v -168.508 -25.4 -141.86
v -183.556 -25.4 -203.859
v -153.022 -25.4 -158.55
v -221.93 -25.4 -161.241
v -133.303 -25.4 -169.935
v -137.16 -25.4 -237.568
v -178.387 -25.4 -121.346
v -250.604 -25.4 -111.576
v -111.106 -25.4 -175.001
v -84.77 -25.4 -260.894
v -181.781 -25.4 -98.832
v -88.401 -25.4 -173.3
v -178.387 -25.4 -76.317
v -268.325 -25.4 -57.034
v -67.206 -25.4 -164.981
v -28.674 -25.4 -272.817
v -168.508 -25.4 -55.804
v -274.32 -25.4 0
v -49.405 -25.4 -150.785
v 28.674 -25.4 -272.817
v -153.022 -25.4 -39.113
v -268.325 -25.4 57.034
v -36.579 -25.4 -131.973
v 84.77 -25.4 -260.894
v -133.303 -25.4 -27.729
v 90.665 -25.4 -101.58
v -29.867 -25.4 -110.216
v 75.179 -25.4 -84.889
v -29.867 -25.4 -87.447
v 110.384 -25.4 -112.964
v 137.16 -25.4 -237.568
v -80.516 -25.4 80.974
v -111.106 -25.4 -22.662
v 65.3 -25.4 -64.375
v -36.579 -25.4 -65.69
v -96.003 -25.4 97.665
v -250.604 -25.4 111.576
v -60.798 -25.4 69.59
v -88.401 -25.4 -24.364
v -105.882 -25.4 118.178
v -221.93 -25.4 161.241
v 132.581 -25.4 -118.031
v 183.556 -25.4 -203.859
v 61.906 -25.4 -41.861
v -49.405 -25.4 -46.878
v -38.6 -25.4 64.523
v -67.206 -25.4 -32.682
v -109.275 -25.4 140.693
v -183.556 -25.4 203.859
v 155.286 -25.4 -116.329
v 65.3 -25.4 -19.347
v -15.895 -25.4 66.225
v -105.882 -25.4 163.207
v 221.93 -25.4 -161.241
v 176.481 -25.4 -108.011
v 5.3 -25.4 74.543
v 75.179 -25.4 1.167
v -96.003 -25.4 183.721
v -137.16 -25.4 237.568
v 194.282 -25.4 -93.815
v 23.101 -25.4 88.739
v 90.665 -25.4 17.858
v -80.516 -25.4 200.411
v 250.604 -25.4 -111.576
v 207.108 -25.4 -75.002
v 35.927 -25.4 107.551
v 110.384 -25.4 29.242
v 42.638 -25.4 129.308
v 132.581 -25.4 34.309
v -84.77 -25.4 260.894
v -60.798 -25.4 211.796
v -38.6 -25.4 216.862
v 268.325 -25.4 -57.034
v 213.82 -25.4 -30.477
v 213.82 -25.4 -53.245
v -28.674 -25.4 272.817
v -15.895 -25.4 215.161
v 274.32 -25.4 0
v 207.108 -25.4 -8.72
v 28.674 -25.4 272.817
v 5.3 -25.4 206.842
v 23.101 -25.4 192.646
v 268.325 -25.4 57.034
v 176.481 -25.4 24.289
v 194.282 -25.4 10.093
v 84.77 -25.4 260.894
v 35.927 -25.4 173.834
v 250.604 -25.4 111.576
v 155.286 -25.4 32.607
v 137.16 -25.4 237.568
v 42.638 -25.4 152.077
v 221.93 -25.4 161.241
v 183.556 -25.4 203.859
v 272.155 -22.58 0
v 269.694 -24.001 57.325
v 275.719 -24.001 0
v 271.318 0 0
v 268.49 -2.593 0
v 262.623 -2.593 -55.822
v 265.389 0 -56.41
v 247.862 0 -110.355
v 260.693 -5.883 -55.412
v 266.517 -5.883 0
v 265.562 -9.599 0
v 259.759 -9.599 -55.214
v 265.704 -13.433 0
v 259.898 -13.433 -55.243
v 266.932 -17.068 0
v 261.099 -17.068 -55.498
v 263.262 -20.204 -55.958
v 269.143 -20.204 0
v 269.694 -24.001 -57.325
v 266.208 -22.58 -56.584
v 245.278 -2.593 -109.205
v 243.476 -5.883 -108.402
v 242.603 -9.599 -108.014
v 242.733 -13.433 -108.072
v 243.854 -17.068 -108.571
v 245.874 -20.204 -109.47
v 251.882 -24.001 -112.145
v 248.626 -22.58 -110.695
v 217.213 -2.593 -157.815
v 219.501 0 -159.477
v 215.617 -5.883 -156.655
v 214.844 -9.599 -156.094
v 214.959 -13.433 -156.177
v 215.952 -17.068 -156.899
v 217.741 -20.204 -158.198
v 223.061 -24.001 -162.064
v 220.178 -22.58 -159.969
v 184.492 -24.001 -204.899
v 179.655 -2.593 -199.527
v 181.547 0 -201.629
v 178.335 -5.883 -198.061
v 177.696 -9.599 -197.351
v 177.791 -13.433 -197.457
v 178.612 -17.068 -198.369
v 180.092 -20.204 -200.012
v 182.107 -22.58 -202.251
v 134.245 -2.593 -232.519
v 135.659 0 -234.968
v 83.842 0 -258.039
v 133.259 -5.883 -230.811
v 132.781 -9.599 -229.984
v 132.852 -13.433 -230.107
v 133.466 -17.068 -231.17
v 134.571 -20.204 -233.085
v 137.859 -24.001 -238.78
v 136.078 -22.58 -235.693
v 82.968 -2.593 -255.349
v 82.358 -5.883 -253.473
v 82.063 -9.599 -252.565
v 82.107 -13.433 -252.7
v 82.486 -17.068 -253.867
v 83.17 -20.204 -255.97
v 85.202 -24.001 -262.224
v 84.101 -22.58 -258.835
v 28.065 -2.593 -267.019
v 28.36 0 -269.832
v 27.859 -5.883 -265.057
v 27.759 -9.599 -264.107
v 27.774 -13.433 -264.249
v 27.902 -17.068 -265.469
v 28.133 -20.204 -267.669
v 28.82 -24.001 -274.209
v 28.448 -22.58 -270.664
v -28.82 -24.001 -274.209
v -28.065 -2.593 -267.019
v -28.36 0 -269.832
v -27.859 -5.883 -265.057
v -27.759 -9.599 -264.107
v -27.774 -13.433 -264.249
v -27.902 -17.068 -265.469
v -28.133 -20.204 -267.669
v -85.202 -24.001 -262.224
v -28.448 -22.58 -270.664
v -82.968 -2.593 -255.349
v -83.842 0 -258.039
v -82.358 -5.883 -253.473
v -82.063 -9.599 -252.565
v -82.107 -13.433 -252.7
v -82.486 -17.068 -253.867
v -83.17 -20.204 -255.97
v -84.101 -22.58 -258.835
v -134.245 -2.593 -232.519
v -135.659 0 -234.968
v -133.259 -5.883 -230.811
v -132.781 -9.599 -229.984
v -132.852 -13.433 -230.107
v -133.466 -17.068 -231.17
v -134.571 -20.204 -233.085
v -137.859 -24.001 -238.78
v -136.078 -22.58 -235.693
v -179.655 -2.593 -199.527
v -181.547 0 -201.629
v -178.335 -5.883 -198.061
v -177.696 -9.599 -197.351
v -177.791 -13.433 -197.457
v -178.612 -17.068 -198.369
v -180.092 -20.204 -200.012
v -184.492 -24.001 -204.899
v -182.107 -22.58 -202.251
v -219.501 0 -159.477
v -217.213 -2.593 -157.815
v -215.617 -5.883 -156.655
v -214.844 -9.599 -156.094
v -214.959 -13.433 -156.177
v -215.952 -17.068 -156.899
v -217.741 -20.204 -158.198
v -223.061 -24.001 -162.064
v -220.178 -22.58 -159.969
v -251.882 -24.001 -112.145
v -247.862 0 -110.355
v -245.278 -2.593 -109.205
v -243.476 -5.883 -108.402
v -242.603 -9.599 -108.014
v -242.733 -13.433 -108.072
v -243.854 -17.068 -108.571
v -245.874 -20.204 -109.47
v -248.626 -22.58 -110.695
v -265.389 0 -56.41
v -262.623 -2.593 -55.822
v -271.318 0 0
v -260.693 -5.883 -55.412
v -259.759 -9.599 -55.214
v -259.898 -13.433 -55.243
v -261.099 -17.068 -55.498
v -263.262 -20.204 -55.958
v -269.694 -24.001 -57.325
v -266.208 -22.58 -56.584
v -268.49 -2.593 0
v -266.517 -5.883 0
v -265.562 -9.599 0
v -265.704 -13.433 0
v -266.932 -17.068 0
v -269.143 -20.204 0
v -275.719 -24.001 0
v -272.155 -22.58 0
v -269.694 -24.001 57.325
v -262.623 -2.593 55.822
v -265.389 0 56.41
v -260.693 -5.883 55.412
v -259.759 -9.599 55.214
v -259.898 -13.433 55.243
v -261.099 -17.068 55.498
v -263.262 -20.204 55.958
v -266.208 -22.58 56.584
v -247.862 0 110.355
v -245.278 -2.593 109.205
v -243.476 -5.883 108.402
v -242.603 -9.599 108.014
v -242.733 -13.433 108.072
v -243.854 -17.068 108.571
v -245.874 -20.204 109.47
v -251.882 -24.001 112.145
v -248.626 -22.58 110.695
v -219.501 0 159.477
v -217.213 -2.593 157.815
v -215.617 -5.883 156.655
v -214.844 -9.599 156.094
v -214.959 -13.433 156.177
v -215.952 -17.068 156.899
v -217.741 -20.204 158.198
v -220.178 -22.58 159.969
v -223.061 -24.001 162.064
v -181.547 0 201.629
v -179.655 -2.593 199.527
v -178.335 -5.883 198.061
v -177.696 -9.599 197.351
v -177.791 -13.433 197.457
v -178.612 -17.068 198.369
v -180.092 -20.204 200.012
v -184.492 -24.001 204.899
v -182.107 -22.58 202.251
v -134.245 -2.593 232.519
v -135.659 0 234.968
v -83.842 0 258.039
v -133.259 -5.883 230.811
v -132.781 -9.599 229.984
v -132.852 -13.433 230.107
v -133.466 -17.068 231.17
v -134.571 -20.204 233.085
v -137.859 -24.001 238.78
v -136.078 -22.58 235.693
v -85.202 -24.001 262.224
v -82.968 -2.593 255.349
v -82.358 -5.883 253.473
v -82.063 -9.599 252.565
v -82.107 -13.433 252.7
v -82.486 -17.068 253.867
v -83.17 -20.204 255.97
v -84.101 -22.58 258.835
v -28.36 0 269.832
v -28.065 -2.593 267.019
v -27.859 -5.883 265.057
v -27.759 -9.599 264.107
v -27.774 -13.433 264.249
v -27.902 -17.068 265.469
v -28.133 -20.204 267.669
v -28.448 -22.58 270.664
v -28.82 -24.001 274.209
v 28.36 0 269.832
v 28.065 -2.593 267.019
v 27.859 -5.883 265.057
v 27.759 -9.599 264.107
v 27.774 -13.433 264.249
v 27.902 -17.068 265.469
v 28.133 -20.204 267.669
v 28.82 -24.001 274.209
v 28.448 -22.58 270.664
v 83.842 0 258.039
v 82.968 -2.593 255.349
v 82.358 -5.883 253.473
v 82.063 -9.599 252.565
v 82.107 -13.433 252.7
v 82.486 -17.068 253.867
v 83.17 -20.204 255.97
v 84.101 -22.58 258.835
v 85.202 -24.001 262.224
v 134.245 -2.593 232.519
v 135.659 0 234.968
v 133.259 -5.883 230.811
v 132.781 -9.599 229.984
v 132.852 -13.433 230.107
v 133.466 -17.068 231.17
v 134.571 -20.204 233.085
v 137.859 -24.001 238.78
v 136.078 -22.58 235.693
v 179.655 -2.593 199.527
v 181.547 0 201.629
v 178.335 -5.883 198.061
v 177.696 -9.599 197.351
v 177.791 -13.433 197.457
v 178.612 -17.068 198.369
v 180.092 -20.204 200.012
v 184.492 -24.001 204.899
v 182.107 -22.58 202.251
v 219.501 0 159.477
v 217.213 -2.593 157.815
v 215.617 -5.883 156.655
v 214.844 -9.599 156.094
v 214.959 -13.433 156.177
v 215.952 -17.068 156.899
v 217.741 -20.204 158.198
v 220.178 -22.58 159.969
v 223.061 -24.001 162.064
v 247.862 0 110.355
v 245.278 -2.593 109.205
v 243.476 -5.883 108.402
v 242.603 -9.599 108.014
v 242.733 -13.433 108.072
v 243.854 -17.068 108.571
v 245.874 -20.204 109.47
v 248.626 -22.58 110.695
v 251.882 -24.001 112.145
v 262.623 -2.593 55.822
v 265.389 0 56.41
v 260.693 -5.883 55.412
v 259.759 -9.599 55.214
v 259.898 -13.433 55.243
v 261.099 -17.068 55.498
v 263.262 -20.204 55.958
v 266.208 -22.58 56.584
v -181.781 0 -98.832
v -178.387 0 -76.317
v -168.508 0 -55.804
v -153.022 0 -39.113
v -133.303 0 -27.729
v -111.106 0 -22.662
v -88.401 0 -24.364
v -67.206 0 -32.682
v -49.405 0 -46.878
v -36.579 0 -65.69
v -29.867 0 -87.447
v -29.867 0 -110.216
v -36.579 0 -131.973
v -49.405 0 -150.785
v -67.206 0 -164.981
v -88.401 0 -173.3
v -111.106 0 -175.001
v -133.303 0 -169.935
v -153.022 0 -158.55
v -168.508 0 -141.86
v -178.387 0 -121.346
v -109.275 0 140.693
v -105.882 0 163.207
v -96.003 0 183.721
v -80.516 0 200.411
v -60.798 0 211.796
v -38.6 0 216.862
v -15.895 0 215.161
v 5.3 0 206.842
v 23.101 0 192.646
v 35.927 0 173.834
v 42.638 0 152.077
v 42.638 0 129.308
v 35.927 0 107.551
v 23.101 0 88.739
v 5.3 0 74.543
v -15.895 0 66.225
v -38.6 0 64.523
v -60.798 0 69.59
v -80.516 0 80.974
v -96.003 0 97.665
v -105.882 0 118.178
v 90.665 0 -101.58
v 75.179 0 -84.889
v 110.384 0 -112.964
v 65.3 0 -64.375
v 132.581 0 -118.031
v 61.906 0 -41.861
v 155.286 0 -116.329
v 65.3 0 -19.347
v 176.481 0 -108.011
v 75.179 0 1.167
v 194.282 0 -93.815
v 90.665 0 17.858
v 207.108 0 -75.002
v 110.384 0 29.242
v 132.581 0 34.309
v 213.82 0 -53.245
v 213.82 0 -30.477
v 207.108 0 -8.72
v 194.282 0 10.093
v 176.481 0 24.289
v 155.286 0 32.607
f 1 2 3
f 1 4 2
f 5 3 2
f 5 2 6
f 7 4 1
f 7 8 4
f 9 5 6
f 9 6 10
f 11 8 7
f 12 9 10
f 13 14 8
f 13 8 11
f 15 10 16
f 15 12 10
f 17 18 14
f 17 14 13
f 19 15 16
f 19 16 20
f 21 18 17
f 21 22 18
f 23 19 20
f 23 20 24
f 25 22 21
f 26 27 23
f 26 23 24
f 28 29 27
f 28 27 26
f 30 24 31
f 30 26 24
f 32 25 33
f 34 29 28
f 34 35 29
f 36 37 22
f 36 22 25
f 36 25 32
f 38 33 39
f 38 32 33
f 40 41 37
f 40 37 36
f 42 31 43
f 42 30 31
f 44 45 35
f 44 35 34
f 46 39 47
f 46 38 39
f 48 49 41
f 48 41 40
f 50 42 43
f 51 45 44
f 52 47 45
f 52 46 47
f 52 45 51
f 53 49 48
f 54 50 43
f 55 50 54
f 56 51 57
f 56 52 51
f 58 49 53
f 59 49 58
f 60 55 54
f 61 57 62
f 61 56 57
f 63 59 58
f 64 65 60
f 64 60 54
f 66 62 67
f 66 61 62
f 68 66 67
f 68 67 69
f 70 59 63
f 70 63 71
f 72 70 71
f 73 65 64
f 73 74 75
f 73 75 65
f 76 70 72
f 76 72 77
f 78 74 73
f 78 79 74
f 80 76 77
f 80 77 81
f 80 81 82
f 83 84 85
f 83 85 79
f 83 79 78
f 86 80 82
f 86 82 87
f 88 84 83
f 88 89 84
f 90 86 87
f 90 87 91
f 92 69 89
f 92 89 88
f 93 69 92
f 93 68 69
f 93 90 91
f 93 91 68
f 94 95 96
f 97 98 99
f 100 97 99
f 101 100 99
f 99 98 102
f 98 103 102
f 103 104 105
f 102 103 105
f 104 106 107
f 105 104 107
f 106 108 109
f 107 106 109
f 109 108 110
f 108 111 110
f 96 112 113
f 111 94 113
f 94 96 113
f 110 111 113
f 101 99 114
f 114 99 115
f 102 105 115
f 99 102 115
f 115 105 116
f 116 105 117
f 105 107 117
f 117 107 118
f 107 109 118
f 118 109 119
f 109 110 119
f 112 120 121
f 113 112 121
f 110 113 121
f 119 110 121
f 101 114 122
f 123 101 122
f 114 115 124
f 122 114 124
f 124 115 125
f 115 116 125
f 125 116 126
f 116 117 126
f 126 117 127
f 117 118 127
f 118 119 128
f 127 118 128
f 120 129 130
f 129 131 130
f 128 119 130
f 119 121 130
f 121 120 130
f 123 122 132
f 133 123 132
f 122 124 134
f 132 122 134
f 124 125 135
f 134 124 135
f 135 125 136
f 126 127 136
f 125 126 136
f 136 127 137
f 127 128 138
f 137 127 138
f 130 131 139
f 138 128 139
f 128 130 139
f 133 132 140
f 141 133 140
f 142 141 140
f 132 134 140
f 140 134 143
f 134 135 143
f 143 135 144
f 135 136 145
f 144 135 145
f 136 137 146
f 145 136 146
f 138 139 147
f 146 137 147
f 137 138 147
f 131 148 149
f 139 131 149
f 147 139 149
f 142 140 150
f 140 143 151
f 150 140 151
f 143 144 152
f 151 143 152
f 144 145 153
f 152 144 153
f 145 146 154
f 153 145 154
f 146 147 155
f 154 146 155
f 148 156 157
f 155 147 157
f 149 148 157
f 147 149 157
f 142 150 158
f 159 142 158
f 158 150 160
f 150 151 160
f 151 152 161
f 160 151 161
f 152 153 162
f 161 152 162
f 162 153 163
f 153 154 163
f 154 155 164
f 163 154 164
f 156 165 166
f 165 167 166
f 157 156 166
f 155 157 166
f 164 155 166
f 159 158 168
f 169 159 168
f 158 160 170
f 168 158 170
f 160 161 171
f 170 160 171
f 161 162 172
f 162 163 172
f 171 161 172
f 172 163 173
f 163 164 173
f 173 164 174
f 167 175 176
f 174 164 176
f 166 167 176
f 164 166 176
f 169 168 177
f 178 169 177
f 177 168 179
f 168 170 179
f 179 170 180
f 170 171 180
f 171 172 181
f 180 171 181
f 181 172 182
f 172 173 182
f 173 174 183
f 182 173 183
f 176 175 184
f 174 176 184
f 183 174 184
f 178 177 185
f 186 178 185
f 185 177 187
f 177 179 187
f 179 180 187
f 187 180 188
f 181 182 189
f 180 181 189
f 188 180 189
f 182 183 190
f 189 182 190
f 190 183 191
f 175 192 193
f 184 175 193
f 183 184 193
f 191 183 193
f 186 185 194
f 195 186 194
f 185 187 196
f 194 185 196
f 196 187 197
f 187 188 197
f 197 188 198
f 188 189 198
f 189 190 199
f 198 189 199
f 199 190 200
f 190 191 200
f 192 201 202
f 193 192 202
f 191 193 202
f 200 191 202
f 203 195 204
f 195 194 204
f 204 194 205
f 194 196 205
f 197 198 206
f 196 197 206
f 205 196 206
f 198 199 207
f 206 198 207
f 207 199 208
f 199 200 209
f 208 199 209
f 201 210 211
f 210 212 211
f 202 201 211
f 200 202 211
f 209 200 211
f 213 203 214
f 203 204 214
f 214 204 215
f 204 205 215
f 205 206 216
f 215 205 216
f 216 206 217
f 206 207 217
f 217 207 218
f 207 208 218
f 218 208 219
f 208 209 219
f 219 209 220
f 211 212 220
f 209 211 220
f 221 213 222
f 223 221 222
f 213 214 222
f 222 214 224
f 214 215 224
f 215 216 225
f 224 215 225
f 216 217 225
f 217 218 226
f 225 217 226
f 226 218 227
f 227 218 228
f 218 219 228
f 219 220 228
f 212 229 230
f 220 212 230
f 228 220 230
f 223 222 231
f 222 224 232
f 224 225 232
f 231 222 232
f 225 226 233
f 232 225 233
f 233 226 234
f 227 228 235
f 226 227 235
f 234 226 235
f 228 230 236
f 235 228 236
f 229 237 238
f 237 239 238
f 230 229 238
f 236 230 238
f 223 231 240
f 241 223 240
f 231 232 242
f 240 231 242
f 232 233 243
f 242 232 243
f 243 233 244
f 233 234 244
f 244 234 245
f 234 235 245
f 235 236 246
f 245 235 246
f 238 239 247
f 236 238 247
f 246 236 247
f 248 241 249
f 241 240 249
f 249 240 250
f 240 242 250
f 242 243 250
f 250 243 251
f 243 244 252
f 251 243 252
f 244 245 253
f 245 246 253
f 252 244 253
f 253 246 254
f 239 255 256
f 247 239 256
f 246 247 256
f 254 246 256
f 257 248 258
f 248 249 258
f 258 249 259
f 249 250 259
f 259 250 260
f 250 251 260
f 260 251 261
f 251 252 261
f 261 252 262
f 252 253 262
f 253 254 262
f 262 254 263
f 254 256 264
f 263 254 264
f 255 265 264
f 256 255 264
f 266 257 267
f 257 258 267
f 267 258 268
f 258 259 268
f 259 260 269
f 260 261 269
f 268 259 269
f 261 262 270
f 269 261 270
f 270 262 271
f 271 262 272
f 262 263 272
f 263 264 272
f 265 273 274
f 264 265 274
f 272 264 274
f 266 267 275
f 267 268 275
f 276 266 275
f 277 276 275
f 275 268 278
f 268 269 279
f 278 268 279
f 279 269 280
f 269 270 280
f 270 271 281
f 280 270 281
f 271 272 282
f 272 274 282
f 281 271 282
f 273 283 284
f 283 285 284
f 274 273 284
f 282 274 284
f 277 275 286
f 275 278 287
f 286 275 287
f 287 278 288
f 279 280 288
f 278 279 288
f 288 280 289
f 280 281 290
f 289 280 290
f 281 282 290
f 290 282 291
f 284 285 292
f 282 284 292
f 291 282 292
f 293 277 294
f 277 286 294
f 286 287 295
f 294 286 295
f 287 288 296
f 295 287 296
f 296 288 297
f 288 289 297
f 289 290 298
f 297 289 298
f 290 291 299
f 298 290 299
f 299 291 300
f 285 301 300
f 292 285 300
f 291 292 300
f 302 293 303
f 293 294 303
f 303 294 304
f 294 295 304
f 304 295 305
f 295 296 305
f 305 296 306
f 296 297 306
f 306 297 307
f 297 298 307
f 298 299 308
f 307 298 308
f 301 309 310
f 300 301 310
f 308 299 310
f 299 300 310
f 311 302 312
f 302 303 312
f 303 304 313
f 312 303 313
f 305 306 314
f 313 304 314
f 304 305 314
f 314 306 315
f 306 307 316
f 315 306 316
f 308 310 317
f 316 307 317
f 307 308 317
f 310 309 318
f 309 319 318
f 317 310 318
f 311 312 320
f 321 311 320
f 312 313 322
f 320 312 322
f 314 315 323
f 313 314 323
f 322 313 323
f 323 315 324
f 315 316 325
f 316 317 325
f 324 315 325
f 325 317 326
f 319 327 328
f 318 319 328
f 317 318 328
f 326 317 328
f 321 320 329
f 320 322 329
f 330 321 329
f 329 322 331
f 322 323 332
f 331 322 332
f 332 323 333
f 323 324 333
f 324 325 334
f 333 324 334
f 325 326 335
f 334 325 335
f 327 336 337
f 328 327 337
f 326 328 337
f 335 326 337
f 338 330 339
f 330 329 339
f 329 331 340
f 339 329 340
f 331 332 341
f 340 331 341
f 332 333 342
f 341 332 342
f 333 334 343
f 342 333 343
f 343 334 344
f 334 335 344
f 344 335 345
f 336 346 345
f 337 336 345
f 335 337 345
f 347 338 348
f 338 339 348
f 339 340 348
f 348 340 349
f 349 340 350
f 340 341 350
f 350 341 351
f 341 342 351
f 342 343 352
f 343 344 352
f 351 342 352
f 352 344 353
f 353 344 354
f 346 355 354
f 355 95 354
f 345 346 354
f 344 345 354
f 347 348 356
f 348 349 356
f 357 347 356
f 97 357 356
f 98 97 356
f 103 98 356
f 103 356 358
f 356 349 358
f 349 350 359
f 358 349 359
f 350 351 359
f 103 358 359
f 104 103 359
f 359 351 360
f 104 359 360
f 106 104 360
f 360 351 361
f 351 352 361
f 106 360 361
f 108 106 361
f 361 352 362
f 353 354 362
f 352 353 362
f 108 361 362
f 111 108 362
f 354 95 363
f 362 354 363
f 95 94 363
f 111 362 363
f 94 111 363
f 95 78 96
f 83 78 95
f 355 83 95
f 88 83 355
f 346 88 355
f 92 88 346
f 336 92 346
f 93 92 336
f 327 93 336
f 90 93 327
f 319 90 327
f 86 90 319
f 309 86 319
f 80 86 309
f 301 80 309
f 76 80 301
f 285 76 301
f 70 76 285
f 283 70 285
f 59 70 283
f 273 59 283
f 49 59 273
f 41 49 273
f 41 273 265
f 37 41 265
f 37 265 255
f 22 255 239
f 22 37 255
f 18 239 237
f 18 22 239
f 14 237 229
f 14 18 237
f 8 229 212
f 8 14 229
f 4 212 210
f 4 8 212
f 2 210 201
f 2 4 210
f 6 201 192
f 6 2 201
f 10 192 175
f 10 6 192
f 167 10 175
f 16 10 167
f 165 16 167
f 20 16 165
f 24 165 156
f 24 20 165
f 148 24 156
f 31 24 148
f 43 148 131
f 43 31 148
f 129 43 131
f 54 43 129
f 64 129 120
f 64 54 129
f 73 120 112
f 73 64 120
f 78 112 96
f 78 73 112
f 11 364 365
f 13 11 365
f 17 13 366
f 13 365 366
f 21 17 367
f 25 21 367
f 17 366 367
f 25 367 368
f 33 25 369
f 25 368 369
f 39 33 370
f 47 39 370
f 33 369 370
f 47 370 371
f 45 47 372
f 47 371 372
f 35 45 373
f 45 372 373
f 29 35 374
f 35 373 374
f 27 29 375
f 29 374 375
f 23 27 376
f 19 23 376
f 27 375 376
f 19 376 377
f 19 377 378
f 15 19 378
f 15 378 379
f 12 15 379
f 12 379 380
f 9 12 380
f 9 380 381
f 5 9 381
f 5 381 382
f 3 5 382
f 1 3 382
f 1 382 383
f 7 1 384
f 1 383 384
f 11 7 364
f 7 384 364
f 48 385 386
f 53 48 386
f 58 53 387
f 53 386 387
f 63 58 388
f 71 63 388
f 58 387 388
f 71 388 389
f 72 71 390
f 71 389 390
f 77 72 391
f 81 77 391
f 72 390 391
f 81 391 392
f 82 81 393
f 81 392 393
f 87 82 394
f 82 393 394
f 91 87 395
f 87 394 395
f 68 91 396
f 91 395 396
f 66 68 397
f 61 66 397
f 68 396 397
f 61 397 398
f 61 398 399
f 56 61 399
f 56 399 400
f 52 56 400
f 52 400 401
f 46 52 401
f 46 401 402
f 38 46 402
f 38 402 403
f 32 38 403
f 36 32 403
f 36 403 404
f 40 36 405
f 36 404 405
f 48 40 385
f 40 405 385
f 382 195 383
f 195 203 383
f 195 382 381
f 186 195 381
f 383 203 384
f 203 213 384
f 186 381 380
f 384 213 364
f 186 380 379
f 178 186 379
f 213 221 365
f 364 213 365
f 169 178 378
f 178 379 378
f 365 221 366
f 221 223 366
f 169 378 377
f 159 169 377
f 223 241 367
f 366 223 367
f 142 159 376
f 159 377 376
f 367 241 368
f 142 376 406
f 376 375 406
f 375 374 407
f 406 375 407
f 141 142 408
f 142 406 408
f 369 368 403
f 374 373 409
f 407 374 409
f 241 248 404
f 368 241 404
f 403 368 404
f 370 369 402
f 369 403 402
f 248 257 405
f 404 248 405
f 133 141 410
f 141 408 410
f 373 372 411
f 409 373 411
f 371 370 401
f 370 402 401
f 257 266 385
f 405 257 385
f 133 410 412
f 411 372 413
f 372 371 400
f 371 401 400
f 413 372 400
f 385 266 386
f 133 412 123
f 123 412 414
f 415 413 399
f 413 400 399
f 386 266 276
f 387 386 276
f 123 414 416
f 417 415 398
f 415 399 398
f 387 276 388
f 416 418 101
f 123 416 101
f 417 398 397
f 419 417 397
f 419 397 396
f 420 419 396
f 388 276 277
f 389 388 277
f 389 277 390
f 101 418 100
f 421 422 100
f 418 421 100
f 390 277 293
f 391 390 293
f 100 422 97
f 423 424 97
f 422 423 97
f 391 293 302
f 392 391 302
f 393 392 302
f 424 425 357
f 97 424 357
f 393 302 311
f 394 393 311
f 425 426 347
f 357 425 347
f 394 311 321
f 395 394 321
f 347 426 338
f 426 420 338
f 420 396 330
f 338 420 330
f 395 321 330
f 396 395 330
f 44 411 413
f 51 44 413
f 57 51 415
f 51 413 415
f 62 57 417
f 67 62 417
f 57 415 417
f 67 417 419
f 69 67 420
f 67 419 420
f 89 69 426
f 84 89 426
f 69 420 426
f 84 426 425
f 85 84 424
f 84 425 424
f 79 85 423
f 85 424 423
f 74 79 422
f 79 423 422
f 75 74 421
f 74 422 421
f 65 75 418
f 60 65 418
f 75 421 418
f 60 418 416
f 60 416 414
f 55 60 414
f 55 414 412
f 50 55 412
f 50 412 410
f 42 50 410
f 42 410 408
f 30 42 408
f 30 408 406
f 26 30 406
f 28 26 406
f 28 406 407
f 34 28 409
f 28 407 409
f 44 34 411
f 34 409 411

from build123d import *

# Parameters (mm, degrees)
F0_R     = 279.4
F1_DEPTH = 25.4
F2_R     = 13.3406236018
F6_R     = 76.3831689613
F7_DEPTH = 25.4


# Not quite as in the source:
# - a fillet or chamfer that OpenCascade refuses, or shapes differently, is made with other operations: its cross-section is extruded or revolved along the edge and cut away or added


with BuildPart() as f1:
    # F0 (on Front) → F1 (new body)
    with BuildSketch(Plane.XZ):
        Circle(F0_R)
    extrude(amount=F1_DEPTH)

    # F2 (on Top) → F3 (revolve, cut)
    with BuildSketch(Plane.XY):
        with Locations((278.8262367249, -11.0273361206)):
            Circle(F2_R)
    revolve(axis=Axis((0, 0, 0), (0, 1, 0)), mode=Mode.SUBTRACT)

    # F4: chamfer of 5.08 on 1 edges, made by hand

    # F4_s1 → F4_t2 (revolve, cut)
    with BuildSketch(Plane.XY):
        Polygon((279.4, -20.32), (274.32, -25.4), (279.4, -25.4), align=None)
    revolve(axis=Axis((0, -25.4, 0), (0, -1, 0)), mode=Mode.SUBTRACT)

    # F6 (on face) → F7 (cut)
    with BuildSketch(Plane(origin=(0, 0, 0), x_dir=(-1, 0, 0), z_dir=(0, 1, 0))):
        with Locations((-138.2894814014, -41.8609678745)):
            Circle(F6_R)
        with Locations((32.8920790944, 140.6926879071)):
            Circle(F6_R)
        with Locations((105.3974023071, -98.8317200326)):
            Circle(F6_R)
    extrude(amount=-F7_DEPTH, mode=Mode.SUBTRACT)


solid = f1.part
